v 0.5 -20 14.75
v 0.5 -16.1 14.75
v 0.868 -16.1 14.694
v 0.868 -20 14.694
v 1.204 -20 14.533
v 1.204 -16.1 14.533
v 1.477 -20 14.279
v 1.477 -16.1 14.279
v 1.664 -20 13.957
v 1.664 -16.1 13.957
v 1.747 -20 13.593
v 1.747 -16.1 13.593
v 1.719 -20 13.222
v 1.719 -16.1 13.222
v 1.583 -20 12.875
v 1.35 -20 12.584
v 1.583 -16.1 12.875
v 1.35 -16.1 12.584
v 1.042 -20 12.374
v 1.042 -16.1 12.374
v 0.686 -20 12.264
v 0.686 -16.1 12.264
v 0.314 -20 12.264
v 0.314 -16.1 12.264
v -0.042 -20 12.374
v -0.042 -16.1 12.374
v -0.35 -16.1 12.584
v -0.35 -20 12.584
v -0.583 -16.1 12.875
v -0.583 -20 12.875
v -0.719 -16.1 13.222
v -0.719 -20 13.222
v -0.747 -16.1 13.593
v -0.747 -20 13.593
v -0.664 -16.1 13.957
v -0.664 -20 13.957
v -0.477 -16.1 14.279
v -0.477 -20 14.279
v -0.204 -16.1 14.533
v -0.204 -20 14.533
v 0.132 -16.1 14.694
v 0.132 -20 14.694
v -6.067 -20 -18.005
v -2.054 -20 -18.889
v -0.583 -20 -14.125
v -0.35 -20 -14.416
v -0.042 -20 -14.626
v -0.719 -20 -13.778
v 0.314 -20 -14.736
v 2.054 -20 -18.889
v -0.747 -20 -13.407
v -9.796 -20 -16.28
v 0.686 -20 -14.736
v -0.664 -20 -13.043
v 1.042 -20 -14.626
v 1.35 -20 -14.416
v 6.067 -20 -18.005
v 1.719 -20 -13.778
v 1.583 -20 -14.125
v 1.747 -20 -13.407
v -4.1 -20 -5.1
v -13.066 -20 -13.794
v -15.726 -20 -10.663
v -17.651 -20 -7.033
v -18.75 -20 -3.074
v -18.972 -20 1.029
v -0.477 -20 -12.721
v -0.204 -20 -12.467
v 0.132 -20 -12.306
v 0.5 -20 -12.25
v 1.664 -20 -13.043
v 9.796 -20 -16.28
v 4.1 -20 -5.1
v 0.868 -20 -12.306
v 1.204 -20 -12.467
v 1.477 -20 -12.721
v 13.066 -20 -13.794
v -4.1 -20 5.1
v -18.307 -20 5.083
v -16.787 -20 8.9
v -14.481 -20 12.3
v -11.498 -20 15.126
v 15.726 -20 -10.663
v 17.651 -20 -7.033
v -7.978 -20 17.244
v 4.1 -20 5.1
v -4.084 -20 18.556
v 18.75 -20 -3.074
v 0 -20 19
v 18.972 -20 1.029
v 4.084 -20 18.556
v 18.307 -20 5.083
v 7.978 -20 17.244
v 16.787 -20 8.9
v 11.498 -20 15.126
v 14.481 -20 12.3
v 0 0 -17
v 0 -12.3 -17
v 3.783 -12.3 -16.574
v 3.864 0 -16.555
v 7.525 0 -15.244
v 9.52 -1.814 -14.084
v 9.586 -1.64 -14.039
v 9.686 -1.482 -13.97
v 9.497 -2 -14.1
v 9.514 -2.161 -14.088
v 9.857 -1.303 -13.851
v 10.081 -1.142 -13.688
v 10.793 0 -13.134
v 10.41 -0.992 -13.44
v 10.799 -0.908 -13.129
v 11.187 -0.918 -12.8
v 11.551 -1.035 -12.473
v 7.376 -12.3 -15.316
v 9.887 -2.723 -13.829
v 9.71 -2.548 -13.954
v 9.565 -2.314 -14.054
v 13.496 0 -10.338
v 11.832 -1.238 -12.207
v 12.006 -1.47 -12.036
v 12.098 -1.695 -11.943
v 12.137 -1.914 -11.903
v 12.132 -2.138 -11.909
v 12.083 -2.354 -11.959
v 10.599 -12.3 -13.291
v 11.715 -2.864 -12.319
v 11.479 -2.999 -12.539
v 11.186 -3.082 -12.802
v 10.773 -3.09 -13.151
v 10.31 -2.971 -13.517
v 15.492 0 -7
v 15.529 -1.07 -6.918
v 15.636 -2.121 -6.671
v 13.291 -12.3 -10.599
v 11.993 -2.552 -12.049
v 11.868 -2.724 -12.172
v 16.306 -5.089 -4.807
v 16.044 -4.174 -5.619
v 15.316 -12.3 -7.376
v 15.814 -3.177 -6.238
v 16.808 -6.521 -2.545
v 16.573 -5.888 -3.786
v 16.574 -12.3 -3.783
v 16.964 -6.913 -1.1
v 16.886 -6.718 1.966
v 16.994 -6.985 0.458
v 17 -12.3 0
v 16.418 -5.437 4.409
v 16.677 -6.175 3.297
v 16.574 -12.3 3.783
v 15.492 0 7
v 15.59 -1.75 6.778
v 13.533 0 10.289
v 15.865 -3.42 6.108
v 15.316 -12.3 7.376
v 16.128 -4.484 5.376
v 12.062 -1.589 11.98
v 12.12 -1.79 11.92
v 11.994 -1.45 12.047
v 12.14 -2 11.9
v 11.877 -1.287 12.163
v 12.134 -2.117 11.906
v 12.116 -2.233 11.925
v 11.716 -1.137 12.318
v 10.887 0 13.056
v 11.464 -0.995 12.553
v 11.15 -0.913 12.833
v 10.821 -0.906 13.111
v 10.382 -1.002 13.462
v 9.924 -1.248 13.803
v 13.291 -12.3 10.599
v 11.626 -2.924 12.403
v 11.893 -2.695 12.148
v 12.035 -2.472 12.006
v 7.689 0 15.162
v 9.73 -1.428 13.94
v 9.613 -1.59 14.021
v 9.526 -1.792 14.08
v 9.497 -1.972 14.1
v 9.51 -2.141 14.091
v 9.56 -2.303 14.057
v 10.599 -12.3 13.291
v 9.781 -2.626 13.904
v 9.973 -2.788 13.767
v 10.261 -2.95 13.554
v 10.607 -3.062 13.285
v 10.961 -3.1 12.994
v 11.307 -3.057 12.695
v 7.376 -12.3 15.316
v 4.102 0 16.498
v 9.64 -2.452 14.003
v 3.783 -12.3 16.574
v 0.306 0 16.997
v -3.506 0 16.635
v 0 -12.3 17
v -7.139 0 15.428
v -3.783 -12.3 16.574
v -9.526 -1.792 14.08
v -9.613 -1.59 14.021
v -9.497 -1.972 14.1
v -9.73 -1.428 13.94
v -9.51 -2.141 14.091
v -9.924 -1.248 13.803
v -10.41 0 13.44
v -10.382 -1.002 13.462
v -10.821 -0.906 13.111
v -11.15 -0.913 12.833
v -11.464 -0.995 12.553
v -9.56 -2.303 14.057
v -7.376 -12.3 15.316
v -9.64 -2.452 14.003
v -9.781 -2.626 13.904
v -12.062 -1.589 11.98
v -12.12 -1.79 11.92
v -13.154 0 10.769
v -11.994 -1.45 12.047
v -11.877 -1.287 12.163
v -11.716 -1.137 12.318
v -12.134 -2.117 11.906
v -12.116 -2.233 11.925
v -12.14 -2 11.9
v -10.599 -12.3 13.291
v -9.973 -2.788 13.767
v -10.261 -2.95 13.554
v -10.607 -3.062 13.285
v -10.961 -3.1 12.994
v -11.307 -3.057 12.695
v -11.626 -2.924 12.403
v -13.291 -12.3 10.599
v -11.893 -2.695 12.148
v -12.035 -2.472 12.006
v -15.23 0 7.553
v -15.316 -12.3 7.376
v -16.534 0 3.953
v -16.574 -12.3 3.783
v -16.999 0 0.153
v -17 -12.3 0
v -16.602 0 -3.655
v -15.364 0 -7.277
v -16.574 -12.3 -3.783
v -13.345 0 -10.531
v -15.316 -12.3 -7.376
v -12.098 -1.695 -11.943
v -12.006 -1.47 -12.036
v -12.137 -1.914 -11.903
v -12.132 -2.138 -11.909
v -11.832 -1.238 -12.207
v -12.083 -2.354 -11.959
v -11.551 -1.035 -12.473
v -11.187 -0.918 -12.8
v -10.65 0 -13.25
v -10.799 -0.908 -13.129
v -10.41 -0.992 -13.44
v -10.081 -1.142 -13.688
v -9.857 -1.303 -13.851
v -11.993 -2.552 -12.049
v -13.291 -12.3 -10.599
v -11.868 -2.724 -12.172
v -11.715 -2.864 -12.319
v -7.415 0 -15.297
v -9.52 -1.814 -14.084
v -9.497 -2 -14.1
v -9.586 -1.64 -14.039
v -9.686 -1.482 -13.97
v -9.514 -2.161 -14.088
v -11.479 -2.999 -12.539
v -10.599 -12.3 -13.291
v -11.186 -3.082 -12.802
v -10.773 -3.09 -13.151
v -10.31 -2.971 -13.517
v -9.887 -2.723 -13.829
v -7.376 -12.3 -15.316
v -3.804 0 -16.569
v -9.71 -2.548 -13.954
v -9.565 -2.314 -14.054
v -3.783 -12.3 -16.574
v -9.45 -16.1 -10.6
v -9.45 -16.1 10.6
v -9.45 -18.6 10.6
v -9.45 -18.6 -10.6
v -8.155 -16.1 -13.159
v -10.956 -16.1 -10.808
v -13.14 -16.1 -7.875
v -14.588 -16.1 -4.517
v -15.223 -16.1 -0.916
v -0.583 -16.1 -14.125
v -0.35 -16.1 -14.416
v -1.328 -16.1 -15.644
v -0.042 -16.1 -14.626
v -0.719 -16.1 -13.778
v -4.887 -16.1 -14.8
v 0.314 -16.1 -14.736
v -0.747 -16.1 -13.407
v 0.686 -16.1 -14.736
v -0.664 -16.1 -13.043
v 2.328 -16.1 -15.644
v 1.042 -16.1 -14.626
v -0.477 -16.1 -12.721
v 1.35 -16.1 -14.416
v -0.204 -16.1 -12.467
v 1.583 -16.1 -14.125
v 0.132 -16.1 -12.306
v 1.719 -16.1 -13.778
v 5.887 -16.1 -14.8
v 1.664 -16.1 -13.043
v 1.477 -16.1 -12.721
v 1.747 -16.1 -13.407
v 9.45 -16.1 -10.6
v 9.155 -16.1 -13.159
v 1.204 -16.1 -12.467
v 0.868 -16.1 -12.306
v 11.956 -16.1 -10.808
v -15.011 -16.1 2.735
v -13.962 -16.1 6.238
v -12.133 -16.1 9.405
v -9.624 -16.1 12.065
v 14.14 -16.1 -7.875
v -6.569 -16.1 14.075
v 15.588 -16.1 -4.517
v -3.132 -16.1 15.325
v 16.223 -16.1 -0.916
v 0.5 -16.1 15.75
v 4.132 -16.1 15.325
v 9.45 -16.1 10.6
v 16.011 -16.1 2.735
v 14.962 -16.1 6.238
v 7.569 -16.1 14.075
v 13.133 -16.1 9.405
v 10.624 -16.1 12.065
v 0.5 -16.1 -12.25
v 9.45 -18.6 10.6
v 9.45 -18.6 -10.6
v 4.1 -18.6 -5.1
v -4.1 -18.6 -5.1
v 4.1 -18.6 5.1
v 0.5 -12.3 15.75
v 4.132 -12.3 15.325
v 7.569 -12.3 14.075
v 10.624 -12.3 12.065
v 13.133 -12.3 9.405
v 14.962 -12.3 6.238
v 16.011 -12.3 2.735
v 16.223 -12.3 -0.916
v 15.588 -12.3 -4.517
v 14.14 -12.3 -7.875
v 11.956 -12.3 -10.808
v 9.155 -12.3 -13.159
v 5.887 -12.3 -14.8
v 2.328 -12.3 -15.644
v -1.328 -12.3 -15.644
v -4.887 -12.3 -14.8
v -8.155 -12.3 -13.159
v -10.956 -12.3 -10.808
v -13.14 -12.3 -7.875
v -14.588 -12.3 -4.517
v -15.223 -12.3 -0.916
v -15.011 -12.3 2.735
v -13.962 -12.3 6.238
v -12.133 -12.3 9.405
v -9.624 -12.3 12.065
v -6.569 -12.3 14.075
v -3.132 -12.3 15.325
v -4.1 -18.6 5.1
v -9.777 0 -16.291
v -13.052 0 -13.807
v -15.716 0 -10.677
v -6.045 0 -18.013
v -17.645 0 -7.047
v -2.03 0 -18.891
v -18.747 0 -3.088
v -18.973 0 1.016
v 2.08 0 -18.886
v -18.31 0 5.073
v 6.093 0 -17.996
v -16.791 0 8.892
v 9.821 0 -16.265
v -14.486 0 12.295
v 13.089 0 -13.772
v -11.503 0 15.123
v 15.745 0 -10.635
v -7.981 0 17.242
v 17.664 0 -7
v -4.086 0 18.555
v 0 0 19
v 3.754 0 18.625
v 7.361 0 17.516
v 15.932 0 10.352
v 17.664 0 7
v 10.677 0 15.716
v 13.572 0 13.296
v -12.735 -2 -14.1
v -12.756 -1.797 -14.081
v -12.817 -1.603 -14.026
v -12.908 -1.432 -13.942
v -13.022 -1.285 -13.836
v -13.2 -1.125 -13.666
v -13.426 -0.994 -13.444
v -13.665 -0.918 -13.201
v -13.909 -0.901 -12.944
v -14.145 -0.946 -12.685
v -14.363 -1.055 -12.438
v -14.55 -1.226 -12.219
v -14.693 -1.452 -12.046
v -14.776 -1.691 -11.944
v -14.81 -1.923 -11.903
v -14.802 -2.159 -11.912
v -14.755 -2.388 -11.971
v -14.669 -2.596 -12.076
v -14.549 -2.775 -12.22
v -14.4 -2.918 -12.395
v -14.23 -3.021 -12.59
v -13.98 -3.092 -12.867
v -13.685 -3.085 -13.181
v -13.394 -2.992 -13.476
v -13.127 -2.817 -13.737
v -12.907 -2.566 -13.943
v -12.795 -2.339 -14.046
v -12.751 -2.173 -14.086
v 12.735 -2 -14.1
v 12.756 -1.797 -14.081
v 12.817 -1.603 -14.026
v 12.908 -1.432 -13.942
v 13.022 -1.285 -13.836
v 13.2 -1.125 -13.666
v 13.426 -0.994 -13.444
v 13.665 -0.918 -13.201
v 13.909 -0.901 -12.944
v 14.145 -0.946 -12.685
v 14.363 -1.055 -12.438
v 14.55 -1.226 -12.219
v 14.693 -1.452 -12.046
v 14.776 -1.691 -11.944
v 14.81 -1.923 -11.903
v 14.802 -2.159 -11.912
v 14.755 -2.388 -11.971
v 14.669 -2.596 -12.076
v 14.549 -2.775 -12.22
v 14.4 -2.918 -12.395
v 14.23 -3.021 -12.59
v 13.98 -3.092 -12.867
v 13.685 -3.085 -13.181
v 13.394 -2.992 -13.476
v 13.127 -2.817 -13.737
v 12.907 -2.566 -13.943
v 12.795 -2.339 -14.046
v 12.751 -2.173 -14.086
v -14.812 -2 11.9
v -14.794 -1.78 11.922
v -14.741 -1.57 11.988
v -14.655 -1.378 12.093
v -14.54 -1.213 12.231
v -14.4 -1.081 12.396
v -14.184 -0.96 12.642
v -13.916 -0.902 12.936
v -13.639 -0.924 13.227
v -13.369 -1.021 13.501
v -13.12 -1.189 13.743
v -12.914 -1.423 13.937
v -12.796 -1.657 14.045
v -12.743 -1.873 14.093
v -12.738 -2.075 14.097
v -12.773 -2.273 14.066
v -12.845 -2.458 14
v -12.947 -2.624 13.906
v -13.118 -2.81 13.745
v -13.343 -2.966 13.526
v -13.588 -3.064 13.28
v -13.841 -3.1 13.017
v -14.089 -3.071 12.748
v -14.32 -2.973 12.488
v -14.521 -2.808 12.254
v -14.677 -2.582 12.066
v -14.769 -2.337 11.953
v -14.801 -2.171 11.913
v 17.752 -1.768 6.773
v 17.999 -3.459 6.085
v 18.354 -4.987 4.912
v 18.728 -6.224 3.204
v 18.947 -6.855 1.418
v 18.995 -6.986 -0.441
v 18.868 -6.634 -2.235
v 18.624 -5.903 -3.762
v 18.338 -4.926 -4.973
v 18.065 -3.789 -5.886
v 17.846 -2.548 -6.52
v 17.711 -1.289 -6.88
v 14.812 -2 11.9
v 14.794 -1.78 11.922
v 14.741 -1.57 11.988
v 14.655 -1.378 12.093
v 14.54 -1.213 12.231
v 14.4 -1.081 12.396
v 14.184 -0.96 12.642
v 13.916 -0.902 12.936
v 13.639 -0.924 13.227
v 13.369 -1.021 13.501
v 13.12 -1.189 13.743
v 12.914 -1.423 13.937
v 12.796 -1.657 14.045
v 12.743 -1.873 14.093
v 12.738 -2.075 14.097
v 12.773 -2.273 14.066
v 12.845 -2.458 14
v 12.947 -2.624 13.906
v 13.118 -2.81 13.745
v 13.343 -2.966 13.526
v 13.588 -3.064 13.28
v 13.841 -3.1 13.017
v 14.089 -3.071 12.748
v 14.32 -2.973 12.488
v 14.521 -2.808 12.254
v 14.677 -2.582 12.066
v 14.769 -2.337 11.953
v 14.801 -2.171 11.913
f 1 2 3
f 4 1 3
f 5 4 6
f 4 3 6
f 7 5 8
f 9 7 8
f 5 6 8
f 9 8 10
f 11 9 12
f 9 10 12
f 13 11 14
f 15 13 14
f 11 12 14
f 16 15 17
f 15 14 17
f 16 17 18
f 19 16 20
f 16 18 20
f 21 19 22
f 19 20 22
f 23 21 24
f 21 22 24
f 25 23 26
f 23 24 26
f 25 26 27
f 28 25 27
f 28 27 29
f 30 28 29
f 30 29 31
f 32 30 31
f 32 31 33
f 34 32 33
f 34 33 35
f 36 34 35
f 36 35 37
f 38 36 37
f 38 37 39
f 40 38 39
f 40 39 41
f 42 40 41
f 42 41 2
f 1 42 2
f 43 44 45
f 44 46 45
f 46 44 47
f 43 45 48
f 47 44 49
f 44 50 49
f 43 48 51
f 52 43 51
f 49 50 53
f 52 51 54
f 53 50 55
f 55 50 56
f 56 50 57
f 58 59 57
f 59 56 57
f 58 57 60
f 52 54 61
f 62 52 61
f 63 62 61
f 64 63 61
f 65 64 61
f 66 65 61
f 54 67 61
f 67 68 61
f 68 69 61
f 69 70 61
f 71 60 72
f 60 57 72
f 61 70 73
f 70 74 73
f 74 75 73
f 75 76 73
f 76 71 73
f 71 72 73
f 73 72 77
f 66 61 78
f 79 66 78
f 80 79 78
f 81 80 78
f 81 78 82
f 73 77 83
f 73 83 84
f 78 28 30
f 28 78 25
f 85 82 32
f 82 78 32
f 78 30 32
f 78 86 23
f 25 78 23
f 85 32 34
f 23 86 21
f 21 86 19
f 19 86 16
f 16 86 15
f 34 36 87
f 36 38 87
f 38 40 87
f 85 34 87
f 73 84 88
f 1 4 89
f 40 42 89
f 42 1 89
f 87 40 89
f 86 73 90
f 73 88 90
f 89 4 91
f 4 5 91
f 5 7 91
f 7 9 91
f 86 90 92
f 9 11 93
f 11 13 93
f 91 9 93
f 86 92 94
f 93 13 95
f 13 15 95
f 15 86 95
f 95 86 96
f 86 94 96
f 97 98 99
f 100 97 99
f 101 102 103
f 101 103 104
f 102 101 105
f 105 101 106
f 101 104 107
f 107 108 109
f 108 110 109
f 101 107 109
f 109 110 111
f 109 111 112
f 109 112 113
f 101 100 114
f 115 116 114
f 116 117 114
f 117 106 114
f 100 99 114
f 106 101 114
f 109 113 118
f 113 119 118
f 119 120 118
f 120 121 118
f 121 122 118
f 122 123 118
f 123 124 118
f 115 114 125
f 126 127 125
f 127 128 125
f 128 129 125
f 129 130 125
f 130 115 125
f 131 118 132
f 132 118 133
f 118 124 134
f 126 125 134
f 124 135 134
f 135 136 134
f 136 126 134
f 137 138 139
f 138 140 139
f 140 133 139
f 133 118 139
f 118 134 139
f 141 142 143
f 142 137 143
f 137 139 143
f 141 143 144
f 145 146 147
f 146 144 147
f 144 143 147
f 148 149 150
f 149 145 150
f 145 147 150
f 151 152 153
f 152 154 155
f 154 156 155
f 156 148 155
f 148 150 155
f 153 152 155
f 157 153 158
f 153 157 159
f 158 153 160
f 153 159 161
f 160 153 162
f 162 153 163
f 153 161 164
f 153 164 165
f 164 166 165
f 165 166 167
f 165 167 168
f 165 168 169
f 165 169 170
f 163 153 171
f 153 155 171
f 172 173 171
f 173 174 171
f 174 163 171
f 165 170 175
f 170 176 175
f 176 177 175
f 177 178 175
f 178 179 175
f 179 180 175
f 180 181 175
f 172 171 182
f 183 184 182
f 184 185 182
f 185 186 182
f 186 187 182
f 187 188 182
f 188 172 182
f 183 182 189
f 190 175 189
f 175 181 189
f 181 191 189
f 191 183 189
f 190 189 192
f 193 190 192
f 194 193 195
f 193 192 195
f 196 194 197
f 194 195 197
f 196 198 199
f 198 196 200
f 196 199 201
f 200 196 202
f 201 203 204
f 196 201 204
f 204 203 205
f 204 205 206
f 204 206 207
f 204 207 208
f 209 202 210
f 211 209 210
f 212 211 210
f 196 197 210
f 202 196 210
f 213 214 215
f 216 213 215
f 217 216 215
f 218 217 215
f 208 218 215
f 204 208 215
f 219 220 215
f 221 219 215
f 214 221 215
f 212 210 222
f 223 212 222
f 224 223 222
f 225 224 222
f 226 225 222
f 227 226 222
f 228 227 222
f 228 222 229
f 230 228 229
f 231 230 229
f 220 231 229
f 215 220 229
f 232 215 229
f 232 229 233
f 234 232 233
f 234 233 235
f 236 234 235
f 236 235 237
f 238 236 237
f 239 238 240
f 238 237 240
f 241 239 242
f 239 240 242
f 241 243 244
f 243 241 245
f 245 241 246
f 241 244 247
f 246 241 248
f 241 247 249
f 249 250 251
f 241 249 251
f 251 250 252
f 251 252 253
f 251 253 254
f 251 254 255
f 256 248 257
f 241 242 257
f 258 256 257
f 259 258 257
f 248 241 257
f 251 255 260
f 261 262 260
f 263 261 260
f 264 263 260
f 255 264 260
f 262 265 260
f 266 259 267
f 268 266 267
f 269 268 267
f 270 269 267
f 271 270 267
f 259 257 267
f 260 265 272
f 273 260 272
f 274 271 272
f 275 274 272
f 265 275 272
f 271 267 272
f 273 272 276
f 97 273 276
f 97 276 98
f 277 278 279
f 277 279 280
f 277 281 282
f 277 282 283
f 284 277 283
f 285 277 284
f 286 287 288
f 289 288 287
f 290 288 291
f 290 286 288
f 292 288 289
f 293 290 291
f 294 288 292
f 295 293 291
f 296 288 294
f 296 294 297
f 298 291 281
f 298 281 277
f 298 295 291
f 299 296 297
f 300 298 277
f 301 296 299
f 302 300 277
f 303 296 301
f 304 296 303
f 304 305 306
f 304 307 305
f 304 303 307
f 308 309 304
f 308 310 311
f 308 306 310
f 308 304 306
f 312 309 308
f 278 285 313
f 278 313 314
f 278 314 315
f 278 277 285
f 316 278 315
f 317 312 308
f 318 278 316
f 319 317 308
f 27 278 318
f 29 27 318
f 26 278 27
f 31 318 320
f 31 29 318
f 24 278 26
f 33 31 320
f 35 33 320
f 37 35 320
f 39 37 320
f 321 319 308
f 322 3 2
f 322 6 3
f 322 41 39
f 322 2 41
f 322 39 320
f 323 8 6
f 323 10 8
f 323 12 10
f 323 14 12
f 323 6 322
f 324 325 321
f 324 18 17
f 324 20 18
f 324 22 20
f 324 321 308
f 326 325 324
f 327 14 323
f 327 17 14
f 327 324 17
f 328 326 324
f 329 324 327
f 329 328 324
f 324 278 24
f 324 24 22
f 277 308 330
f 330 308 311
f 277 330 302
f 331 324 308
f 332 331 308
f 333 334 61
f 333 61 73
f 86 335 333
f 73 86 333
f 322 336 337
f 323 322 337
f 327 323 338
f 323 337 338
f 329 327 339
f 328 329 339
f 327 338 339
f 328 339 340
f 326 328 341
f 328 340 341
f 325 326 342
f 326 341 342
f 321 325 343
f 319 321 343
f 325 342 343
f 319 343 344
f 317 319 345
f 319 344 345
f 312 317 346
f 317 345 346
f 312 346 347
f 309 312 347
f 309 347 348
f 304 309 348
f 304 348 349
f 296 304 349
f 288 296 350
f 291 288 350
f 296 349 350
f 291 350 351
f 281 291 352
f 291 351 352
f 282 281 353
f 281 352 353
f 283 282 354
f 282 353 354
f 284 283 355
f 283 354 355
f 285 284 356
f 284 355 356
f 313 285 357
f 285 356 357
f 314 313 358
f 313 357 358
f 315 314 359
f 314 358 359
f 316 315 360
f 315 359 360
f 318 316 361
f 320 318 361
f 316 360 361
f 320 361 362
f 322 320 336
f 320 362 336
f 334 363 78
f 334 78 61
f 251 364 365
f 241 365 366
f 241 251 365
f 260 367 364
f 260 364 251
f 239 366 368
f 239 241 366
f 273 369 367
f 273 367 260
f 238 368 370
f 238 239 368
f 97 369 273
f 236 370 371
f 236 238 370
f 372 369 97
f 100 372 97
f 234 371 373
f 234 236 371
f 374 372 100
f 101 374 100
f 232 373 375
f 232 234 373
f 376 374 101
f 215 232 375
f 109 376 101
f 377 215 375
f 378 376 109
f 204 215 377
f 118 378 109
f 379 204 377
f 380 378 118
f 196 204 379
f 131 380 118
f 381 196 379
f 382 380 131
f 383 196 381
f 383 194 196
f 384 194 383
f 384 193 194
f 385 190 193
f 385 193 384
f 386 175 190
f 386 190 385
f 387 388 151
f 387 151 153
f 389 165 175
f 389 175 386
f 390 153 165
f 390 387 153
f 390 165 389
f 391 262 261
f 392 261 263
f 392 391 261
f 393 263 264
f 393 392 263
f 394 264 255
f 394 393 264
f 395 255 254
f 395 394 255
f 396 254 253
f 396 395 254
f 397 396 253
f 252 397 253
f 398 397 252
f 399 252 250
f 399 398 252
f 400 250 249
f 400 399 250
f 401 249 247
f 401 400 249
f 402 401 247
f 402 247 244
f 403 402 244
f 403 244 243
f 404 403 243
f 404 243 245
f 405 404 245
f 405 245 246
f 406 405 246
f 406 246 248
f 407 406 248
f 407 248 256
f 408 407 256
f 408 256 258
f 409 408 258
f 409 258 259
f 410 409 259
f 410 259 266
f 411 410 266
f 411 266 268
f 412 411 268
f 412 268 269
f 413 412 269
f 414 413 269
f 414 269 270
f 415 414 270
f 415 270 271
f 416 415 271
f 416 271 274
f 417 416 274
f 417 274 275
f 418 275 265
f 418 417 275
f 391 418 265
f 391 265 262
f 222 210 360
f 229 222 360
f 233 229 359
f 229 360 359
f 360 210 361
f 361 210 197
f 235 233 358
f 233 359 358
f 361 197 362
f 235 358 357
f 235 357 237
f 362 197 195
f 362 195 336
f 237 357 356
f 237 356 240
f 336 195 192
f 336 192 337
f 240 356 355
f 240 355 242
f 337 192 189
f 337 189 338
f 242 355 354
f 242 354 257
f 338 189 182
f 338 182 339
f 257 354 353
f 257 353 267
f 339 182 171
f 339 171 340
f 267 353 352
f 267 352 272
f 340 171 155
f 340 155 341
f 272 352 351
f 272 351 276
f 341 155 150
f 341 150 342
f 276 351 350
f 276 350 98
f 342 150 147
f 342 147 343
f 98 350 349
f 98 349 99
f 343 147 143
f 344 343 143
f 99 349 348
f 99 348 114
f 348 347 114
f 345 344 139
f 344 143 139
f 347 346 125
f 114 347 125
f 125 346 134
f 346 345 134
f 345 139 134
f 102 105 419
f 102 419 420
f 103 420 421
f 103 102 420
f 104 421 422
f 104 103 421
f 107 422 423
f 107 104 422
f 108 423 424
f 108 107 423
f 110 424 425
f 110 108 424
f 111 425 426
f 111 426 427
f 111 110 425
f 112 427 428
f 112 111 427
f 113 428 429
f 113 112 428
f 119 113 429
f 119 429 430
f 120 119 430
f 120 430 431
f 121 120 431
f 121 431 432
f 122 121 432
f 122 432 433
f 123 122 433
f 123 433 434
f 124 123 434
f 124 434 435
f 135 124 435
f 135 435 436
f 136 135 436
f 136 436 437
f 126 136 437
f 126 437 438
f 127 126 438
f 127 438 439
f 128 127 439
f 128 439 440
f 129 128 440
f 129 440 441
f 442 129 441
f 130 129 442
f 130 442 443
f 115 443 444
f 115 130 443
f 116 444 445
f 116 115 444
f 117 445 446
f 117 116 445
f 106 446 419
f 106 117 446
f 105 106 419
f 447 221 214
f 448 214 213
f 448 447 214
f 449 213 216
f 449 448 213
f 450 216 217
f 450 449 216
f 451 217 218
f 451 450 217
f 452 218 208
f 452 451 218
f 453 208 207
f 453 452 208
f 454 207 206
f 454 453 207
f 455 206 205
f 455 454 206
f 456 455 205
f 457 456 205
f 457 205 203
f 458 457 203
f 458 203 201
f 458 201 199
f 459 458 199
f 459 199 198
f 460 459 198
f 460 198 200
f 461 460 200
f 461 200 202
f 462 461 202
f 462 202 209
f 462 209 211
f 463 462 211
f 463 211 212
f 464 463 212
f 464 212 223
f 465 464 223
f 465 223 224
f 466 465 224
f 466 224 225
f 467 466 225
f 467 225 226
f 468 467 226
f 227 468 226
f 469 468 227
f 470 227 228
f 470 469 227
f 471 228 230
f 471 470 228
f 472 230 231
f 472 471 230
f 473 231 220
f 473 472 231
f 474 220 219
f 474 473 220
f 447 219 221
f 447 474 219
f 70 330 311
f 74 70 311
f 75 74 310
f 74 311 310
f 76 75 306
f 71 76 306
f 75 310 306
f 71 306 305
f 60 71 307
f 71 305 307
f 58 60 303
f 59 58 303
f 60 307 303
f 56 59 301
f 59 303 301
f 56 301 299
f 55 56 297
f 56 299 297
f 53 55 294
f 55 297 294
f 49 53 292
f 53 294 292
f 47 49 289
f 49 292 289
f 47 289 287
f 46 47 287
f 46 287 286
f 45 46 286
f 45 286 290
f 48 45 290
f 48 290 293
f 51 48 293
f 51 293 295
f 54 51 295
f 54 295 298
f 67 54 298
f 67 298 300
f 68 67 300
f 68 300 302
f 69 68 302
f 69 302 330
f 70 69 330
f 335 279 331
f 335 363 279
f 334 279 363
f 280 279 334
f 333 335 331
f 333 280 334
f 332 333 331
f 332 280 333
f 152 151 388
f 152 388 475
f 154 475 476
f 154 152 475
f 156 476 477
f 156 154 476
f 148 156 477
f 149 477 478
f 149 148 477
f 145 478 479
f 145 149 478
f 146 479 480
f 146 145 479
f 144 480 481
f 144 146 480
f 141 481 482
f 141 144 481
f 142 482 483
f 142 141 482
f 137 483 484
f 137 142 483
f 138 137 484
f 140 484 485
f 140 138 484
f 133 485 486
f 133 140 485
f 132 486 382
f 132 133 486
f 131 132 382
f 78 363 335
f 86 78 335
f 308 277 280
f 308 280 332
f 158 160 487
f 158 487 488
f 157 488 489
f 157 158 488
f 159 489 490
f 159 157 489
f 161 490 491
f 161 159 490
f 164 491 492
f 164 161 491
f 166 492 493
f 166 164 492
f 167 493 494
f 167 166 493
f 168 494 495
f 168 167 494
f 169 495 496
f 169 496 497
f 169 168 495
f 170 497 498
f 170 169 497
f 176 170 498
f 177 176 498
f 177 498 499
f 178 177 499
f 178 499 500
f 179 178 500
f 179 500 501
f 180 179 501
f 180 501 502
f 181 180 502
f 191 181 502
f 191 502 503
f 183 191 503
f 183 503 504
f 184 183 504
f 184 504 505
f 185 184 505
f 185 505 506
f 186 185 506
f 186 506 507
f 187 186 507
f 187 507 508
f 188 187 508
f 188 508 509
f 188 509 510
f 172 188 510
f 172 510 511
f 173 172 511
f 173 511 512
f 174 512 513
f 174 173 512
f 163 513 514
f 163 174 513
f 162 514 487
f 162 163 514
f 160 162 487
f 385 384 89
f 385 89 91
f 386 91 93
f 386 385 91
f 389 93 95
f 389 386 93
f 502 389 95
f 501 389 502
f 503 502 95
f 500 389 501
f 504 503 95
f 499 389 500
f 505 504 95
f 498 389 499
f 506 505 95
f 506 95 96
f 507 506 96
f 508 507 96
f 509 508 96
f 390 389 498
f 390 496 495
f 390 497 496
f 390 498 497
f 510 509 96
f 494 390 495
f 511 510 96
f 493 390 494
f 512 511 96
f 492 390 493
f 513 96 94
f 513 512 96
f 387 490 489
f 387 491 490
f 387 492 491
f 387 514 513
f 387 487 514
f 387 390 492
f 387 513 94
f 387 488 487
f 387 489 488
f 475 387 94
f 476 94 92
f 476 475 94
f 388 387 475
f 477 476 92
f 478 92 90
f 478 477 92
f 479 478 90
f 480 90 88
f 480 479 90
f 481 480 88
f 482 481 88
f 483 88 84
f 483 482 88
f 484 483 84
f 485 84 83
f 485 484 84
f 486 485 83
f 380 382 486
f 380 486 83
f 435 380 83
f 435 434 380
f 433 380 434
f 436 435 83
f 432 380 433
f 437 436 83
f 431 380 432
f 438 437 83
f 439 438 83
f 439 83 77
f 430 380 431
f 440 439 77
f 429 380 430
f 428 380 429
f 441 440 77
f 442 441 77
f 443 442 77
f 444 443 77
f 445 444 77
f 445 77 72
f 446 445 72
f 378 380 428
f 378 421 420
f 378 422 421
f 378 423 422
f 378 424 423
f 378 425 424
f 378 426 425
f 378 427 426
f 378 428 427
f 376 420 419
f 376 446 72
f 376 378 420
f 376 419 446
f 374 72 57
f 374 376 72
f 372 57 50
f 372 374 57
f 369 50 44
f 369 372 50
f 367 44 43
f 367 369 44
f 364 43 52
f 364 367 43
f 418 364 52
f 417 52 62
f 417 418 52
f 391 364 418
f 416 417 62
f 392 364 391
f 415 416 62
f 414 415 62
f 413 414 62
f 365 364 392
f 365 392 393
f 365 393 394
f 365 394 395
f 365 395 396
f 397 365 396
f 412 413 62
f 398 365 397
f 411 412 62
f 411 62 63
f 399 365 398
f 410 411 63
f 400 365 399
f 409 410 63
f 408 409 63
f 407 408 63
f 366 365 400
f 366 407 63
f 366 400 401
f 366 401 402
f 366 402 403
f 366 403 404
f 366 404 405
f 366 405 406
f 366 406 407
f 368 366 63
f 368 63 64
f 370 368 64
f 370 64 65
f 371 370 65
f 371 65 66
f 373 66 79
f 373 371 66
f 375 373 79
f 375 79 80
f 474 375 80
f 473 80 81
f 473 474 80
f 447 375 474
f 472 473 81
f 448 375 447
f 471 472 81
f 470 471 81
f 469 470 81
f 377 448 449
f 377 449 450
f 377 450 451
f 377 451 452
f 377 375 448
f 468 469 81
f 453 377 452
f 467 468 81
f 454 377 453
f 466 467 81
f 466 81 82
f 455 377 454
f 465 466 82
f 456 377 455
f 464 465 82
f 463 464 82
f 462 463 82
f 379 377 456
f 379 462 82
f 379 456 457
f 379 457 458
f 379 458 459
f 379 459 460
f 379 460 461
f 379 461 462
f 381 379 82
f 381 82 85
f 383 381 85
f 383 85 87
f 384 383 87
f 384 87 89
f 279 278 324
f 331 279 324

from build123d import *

# Parameters (mm, degrees)
SKETCH3_R                            = 19
MAIN_BODY_DEPTH                      = 20
CUT_START                            = -7.7
SKETCH5_R                            = 17
CUT_FOR_HEADERS_DEPTH                = 26.796268449
CUT_FOR_ADNS_WIRES_REACH             = 35.496
CUT_FOR_ADNS_WIRES_END_RADIUS        = 19
SKETCH7_R                            = 7
SKETCH8_R                            = 15.75
CUT_FOR_PCB_DEPTH                    = 3.8
SKETCH9_R                            = 1.25
CUT_FOR_SCREW_HOLES_DEPTH            = 5
SKETCH10_W                           = 18.9
SKETCH10_H                           = 21.2
CUT_FOR_LENS_DEPTH                   = 2.5
CUT_FOR_PUPIL_REACH                  = 34.68
SKETCH11_W                           = 8.2
SKETCH11_H                           = 10.2
CUTS_FOR_BODY_SCREW_HOLES_DEPTH      = 34.496268622
CUTS_FOR_BODY_SCREW_HOLES_DEPTH_BACK = 34.496268622
SKETCH13_R                           = 1.1


with BuildPart() as part:
    # Sketch3 → Main Body (new body)
    with BuildSketch(Plane(origin=(0, 0, 0), x_dir=(1, 0, 0), z_dir=(0, 1, 0))):
        with Locations(Location((0, 0, 0), (0, 0, 270))):
            Circle(SKETCH3_R)
    extrude(amount=-MAIN_BODY_DEPTH)

    # Sketch5 → Cut for Headers (cut, through all)
    with BuildSketch(Plane.XZ.offset(20).offset(CUT_START)):
        with Locations(Location((0, 0, 0), (0, 0, 270))):
            Circle(SKETCH5_R)
    extrude(amount=-CUT_FOR_HEADERS_DEPTH, mode=Mode.SUBTRACT)

    # Cut for ADNS Wires: up to this cylinder (the profile starts inside it)
    cut_for_adns_wires_end = Plane(origin=(0, 0, 0), z_dir=(0, 1, 0)) * Cylinder(CUT_FOR_ADNS_WIRES_END_RADIUS, 109.992, mode=Mode.PRIVATE)
    # Sketch7 → Cut for ADNS Wires (cut, up to the surface)
    with BuildSketch(Plane(origin=(0, 0, 0), x_dir=(0, 0, -1), z_dir=(1, 0, 0)), mode=Mode.PRIVATE) as cut_for_adns_wires_sk1:
        Circle(SKETCH7_R)
    cut_for_adns_wires_tool1 = extrude(cut_for_adns_wires_sk1.sketch, amount=CUT_FOR_ADNS_WIRES_REACH, mode=Mode.PRIVATE) & cut_for_adns_wires_end
    add(cut_for_adns_wires_tool1.solids().sort_by_distance((0, 0, 0))[0], mode=Mode.SUBTRACT)

    # Sketch8 → Cut for PCB (cut)
    with BuildSketch(Plane(origin=(0, -12.3, 0), x_dir=(1, 0, 0), z_dir=(0, 1, 0))):
        with Locations(Location((0.5, 0, 0), (0, 0, 270))):
            Circle(SKETCH8_R)
    extrude(amount=-CUT_FOR_PCB_DEPTH, mode=Mode.SUBTRACT)

    # Sketch9 → Cut for Screw Holes (cut)
    with BuildSketch(Plane(origin=(0, -16.1, 0), x_dir=(1, 0, 0), z_dir=(0, 1, 0))):
        with Locations(Location((0.5, 13.5, 0), (0, 0, 270))):
            Circle(SKETCH9_R)
        with Locations(Location((0.5, -13.5, 0), (0, 0, 270))):
            Circle(SKETCH9_R)
    extrude(amount=-CUT_FOR_SCREW_HOLES_DEPTH, mode=Mode.SUBTRACT)

    # Sketch10 → Cut for Lens (cut)
    with BuildSketch(Plane(origin=(0, -16.1, 0), x_dir=(1, 0, 0), z_dir=(0, 1, 0))):
        Rectangle(SKETCH10_W, SKETCH10_H)
    extrude(amount=-CUT_FOR_LENS_DEPTH, mode=Mode.SUBTRACT)

    # Sketch11 → Cut for Pupil (cut, up to next)
    with BuildSketch(Plane(origin=(0, -18.6, 0), x_dir=(1, 0, 0), z_dir=(0, 1, 0)), mode=Mode.PRIVATE) as cut_for_pupil_sk1:
        Rectangle(SKETCH11_W, SKETCH11_H)
    cut_for_pupil_tool1 = extrude(cut_for_pupil_sk1.sketch, amount=-CUT_FOR_PUPIL_REACH, mode=Mode.PRIVATE) & part.part
    add(cut_for_pupil_tool1.solids().sort_by_distance((0, -18.6, 0))[0], mode=Mode.SUBTRACT)

    # Sketch13 → Cuts for Body Screw Holes (cut, two sides: drawn at the far end of the back side and taken through both)
    with BuildSketch(Plane(origin=(0, 0, 0), x_dir=(0, 0, -1), z_dir=(1, 0, 0)).offset(-CUTS_FOR_BODY_SCREW_HOLES_DEPTH_BACK)):
        with Locations((13, -2)):
            Circle(SKETCH13_R)
        with Locations((-13, -2)):
            Circle(SKETCH13_R)
    extrude(amount=CUTS_FOR_BODY_SCREW_HOLES_DEPTH + CUTS_FOR_BODY_SCREW_HOLES_DEPTH_BACK, mode=Mode.SUBTRACT)


solid = part.part
